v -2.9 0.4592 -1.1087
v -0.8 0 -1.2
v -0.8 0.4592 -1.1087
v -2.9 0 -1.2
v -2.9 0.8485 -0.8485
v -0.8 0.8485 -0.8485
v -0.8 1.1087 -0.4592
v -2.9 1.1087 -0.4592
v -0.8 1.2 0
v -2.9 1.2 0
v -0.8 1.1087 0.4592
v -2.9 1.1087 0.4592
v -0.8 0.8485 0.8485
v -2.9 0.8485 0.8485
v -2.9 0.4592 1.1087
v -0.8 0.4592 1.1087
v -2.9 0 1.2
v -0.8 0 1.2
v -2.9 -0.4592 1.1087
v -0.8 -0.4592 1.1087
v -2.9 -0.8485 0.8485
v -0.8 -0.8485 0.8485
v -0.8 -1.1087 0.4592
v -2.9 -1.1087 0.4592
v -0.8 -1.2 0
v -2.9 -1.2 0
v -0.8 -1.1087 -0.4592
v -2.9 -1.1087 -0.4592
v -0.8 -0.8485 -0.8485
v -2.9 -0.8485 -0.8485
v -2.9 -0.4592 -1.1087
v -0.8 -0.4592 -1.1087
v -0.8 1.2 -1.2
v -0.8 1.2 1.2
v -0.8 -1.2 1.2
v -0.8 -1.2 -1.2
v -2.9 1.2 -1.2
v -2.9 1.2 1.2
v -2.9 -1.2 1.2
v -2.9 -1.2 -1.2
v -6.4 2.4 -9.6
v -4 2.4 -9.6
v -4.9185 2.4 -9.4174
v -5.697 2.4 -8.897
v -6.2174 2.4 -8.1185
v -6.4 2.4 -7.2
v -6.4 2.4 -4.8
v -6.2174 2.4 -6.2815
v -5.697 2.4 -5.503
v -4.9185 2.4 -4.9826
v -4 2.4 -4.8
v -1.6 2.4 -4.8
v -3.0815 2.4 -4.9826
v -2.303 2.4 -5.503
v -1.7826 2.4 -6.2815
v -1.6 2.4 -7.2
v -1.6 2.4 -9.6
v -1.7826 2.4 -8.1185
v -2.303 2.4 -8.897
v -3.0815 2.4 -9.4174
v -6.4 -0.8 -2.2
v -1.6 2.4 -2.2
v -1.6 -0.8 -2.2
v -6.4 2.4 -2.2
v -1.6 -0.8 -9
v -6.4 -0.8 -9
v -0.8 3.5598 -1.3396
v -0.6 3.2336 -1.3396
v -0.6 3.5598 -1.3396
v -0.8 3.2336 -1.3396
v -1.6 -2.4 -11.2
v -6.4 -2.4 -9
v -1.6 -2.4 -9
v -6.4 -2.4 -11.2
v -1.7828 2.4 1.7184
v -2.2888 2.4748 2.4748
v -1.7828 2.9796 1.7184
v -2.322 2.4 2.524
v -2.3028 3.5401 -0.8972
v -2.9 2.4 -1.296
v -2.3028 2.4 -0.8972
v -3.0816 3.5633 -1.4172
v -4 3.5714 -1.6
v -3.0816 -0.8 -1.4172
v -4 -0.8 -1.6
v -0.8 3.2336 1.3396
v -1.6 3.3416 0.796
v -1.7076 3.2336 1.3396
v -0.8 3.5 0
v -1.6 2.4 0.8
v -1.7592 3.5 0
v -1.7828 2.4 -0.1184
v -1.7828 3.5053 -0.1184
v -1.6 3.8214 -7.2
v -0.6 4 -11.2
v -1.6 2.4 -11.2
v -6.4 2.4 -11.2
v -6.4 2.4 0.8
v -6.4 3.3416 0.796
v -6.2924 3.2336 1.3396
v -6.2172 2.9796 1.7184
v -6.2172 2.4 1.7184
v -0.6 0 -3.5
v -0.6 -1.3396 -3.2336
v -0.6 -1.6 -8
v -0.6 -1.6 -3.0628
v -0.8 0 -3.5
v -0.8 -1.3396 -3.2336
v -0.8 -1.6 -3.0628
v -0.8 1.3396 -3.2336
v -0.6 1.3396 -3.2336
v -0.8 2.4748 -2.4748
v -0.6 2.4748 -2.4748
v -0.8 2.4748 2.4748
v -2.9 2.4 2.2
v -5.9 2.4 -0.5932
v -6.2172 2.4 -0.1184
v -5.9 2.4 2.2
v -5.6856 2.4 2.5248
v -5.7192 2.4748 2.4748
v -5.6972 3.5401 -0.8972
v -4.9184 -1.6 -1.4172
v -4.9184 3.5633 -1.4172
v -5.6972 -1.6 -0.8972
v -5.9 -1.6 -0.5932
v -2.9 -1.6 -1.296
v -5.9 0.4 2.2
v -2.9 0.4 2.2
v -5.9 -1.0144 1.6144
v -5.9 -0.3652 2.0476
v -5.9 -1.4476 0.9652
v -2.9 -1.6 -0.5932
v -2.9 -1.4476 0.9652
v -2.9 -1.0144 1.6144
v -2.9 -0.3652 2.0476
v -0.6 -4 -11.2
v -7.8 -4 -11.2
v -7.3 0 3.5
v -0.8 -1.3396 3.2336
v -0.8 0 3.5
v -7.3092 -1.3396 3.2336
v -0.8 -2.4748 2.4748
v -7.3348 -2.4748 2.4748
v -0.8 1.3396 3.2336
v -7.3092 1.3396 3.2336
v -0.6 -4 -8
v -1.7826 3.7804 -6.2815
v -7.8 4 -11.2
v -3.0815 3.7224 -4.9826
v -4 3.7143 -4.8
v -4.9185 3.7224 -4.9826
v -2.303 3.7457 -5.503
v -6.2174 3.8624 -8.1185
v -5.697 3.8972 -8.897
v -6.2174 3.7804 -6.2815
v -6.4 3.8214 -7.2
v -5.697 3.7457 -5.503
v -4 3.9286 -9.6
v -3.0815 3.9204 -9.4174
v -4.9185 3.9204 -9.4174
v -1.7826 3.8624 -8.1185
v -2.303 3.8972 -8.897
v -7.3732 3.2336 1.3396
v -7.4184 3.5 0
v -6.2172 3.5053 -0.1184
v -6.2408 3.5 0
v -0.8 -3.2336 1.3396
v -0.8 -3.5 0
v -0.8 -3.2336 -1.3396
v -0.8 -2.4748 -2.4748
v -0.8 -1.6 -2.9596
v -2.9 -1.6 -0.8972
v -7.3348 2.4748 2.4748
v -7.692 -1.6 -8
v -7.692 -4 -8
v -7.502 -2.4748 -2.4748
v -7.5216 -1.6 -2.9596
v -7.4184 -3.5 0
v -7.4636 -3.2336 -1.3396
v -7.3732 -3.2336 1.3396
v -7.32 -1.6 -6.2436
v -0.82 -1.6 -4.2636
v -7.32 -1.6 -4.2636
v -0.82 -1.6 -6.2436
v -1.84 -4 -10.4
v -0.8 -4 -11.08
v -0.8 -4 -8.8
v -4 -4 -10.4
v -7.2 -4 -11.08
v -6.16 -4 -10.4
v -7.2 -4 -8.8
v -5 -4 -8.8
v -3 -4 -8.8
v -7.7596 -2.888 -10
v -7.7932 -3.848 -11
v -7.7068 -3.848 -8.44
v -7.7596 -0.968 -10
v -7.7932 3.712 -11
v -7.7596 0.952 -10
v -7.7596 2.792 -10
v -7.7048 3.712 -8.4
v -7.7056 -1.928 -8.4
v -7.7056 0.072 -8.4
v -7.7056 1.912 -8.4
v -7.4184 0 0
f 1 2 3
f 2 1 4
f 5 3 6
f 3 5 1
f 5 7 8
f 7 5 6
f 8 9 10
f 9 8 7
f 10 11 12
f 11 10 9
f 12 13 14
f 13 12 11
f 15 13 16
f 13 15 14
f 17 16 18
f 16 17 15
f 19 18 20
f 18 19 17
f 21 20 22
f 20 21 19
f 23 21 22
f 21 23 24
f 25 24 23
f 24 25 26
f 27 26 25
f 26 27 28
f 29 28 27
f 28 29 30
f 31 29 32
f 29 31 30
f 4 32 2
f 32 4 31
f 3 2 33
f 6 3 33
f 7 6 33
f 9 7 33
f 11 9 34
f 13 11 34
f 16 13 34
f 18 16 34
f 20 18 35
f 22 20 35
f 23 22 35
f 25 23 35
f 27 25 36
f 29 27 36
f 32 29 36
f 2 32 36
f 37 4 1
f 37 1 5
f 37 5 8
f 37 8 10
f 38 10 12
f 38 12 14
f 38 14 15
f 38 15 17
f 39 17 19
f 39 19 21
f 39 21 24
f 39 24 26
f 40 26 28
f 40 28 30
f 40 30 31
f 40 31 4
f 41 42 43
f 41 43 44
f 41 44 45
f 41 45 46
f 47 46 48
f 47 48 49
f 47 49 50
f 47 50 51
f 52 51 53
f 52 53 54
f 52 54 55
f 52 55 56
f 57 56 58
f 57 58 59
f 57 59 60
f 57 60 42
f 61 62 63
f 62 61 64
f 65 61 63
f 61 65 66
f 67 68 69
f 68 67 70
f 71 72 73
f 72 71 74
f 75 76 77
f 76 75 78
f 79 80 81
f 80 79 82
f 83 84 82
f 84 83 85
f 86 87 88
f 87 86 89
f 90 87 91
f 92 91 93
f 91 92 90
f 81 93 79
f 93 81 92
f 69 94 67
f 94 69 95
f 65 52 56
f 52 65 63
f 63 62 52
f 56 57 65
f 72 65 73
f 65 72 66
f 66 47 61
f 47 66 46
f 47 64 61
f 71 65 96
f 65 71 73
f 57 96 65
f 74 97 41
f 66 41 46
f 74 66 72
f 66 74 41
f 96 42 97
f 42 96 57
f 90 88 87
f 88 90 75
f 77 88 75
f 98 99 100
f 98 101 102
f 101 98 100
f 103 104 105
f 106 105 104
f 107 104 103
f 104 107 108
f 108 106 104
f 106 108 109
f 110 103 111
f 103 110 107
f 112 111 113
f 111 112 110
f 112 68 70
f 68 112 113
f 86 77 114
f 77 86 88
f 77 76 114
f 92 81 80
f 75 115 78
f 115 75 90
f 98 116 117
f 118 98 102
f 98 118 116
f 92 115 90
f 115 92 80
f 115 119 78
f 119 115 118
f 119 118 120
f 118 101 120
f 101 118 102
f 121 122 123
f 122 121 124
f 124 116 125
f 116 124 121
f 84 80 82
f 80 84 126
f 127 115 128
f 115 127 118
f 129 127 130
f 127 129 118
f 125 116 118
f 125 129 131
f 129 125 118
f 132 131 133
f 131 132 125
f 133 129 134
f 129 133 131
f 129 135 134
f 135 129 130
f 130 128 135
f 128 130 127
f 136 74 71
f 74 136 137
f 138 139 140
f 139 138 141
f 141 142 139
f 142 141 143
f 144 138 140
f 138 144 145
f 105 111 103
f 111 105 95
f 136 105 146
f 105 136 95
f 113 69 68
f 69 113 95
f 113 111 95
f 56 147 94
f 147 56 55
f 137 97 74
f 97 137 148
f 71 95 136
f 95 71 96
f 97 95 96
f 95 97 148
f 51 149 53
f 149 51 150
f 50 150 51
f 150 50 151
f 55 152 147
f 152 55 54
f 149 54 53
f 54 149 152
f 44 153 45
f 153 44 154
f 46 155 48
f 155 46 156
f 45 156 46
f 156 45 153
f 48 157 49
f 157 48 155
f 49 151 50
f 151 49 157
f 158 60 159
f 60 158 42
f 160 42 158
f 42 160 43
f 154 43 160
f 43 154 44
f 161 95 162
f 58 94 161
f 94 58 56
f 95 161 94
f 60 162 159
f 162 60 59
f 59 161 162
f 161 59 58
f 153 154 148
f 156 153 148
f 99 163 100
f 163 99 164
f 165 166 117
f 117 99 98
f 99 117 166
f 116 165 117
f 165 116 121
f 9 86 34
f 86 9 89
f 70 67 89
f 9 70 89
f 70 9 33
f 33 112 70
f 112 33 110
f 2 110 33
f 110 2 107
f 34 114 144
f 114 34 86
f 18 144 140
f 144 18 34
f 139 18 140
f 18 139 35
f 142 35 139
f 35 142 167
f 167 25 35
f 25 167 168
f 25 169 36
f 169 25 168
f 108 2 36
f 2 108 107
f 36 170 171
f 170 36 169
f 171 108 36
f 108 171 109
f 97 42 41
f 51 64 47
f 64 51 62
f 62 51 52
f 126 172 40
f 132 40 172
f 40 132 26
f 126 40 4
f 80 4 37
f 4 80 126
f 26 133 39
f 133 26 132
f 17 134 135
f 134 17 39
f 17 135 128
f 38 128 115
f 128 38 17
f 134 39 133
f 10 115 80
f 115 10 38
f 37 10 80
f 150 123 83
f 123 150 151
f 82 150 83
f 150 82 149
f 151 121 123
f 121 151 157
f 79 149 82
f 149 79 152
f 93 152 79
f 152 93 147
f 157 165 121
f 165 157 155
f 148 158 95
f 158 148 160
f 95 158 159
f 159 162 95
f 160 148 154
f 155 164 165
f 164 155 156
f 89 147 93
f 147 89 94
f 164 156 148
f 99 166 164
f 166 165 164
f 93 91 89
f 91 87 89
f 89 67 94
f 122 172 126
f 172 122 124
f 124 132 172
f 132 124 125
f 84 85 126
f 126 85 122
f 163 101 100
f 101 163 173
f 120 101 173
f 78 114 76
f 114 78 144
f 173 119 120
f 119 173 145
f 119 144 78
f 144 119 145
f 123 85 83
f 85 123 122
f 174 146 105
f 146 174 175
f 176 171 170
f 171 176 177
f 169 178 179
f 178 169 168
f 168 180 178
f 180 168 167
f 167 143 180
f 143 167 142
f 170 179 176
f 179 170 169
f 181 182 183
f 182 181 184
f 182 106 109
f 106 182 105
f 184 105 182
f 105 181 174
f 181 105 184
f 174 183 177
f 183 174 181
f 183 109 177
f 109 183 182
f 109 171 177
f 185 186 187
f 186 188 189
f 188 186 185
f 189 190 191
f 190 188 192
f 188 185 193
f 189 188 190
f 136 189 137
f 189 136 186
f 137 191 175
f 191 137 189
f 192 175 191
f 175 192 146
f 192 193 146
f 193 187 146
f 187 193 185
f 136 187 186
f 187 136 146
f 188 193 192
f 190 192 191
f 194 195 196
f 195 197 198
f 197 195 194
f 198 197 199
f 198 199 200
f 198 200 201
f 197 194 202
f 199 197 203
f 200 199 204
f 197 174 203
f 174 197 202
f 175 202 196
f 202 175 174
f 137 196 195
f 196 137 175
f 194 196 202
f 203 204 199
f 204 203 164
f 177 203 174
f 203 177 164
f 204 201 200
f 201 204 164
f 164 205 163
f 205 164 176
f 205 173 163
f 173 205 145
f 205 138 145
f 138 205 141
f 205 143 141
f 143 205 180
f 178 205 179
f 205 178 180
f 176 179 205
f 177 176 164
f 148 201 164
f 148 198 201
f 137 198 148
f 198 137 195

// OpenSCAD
use <../lib.scad>
use <s/3817bp8is02.scad>
use <s/3817bs02.scad>
use <s/3817bs03.scad>
function ldraw_lib__3816bp8i() = [
// 0 Minifig Leg Right with Reflective Stripe and Silver Triangles on Foot Pattern
// 0 Name: 3816bp8i.dat
// 0 Author: Chris Dee [cwdee]
// 0 !LDRAW_ORG Part UPDATE 2022-01
// 0 !LICENSE Licensed under CC BY 2.0 and CC BY 4.0 : see CAreadme.txt
// 
// 0 BFC CERTIFY CCW
  [0,"BFC","CERTIFY"],
  [0,"BFC","CCW"],
// 
// 0 !KEYWORDS Emmet
// 
// 0 !CMDLINE -c25
// 
// 0 !HISTORY 2015-10-27 [Christophe_Mitillo] Original pattern design
// 0 !HISTORY 2020-06-13 [cwdee] Adapted to corrected geometry
// 0 !HISTORY 2022-01-14 [PTadmin] Official Update 2022-01
// 
// 
// 1 16 0 0 0 -1 0 0 0 1 0 0 0 1 s\3817bs02.dat
  [1,16,0,0,0,-1,0,0,0,1,0,0,0,1, ldraw_lib__s__3817bs02()],
// 0 // Foot Top
// 4 16 -19.23 20 -4 -19.23 20 -10 -1.5 20 -10 -1.5 20 -4
  [4,16,-19.23,20,-4,-19.23,20,-10,-1.5,20,-10,-1.5,20,-4],
// 0 // Curve
// 1 16 0 0 0 -1 0 0 0 1 0 0 0 1 s\3817bs03.dat
  [1,16,0,0,0,-1,0,0,0,1,0,0,0,1, ldraw_lib__s__3817bs03()],
// 0 // Front pattern
// 4 80 -18.3 15.609 -4 -2.05 15.609 -4 -2.05 10.659 -4 -18.3 10.659 -4
  [4,80,-18.3,15.609,-4,-2.05,15.609,-4,-2.05,10.659,-4,-18.3,10.659,-4],
// 4 16 -1.5 20 -4 -1.5 7.657 -4 -2 7.657 -4 -2.05 10.659 -4
  [4,16,-1.5,20,-4,-1.5,7.657,-4,-2,7.657,-4,-2.05,10.659,-4],
// 3 16 -2.05 15.609 -4 -1.5 20 -4 -2.05 10.659 -4
  [3,16,-2.05,15.609,-4,-1.5,20,-4,-2.05,10.659,-4],
// 4 16 -19.23 20 -4 -1.5 20 -4 -2.05 15.609 -4 -18.3 15.609 -4
  [4,16,-19.23,20,-4,-1.5,20,-4,-2.05,15.609,-4,-18.3,15.609,-4],
// 4 16 -18.3 15.609 -4 -18.3 10.659 -4 -18.804 7.399 -4 -19.23 20 -4
  [4,16,-18.3,15.609,-4,-18.3,10.659,-4,-18.804,7.399,-4,-19.23,20,-4],
// 4 16 -2.05 10.659 -4 -2 7.657 -4 -18.804 7.399 -4 -18.3 10.659 -4
  [4,16,-2.05,10.659,-4,-2,7.657,-4,-18.804,7.399,-4,-18.3,10.659,-4],
// 3 16 -2 7.657 -4 -2 7.399 -4 -18.804 7.399 -4
  [3,16,-2,7.657,-4,-2,7.399,-4,-18.804,7.399,-4],
// 0 // Side and foot front
// 1 16 0 0 0 -1 0 0 0 1 0 0 0 1 s\3817bp8is02.dat
  [1,16,0,0,0,-1,0,0,0,1,0,0,0,1, ldraw_lib__s__3817bp8is02()],
];
module ldraw_lib__3816bp8i(step=0, col=false, unit=2/5, alt=false, line=0.2, solid=!$preview)
    makepoly(ldraw_lib__3816bp8i(), step=step, col=col, unit=unit, alt=alt, line=line, solid=solid);
ldraw_lib__3816bp8i(line=0.2);
